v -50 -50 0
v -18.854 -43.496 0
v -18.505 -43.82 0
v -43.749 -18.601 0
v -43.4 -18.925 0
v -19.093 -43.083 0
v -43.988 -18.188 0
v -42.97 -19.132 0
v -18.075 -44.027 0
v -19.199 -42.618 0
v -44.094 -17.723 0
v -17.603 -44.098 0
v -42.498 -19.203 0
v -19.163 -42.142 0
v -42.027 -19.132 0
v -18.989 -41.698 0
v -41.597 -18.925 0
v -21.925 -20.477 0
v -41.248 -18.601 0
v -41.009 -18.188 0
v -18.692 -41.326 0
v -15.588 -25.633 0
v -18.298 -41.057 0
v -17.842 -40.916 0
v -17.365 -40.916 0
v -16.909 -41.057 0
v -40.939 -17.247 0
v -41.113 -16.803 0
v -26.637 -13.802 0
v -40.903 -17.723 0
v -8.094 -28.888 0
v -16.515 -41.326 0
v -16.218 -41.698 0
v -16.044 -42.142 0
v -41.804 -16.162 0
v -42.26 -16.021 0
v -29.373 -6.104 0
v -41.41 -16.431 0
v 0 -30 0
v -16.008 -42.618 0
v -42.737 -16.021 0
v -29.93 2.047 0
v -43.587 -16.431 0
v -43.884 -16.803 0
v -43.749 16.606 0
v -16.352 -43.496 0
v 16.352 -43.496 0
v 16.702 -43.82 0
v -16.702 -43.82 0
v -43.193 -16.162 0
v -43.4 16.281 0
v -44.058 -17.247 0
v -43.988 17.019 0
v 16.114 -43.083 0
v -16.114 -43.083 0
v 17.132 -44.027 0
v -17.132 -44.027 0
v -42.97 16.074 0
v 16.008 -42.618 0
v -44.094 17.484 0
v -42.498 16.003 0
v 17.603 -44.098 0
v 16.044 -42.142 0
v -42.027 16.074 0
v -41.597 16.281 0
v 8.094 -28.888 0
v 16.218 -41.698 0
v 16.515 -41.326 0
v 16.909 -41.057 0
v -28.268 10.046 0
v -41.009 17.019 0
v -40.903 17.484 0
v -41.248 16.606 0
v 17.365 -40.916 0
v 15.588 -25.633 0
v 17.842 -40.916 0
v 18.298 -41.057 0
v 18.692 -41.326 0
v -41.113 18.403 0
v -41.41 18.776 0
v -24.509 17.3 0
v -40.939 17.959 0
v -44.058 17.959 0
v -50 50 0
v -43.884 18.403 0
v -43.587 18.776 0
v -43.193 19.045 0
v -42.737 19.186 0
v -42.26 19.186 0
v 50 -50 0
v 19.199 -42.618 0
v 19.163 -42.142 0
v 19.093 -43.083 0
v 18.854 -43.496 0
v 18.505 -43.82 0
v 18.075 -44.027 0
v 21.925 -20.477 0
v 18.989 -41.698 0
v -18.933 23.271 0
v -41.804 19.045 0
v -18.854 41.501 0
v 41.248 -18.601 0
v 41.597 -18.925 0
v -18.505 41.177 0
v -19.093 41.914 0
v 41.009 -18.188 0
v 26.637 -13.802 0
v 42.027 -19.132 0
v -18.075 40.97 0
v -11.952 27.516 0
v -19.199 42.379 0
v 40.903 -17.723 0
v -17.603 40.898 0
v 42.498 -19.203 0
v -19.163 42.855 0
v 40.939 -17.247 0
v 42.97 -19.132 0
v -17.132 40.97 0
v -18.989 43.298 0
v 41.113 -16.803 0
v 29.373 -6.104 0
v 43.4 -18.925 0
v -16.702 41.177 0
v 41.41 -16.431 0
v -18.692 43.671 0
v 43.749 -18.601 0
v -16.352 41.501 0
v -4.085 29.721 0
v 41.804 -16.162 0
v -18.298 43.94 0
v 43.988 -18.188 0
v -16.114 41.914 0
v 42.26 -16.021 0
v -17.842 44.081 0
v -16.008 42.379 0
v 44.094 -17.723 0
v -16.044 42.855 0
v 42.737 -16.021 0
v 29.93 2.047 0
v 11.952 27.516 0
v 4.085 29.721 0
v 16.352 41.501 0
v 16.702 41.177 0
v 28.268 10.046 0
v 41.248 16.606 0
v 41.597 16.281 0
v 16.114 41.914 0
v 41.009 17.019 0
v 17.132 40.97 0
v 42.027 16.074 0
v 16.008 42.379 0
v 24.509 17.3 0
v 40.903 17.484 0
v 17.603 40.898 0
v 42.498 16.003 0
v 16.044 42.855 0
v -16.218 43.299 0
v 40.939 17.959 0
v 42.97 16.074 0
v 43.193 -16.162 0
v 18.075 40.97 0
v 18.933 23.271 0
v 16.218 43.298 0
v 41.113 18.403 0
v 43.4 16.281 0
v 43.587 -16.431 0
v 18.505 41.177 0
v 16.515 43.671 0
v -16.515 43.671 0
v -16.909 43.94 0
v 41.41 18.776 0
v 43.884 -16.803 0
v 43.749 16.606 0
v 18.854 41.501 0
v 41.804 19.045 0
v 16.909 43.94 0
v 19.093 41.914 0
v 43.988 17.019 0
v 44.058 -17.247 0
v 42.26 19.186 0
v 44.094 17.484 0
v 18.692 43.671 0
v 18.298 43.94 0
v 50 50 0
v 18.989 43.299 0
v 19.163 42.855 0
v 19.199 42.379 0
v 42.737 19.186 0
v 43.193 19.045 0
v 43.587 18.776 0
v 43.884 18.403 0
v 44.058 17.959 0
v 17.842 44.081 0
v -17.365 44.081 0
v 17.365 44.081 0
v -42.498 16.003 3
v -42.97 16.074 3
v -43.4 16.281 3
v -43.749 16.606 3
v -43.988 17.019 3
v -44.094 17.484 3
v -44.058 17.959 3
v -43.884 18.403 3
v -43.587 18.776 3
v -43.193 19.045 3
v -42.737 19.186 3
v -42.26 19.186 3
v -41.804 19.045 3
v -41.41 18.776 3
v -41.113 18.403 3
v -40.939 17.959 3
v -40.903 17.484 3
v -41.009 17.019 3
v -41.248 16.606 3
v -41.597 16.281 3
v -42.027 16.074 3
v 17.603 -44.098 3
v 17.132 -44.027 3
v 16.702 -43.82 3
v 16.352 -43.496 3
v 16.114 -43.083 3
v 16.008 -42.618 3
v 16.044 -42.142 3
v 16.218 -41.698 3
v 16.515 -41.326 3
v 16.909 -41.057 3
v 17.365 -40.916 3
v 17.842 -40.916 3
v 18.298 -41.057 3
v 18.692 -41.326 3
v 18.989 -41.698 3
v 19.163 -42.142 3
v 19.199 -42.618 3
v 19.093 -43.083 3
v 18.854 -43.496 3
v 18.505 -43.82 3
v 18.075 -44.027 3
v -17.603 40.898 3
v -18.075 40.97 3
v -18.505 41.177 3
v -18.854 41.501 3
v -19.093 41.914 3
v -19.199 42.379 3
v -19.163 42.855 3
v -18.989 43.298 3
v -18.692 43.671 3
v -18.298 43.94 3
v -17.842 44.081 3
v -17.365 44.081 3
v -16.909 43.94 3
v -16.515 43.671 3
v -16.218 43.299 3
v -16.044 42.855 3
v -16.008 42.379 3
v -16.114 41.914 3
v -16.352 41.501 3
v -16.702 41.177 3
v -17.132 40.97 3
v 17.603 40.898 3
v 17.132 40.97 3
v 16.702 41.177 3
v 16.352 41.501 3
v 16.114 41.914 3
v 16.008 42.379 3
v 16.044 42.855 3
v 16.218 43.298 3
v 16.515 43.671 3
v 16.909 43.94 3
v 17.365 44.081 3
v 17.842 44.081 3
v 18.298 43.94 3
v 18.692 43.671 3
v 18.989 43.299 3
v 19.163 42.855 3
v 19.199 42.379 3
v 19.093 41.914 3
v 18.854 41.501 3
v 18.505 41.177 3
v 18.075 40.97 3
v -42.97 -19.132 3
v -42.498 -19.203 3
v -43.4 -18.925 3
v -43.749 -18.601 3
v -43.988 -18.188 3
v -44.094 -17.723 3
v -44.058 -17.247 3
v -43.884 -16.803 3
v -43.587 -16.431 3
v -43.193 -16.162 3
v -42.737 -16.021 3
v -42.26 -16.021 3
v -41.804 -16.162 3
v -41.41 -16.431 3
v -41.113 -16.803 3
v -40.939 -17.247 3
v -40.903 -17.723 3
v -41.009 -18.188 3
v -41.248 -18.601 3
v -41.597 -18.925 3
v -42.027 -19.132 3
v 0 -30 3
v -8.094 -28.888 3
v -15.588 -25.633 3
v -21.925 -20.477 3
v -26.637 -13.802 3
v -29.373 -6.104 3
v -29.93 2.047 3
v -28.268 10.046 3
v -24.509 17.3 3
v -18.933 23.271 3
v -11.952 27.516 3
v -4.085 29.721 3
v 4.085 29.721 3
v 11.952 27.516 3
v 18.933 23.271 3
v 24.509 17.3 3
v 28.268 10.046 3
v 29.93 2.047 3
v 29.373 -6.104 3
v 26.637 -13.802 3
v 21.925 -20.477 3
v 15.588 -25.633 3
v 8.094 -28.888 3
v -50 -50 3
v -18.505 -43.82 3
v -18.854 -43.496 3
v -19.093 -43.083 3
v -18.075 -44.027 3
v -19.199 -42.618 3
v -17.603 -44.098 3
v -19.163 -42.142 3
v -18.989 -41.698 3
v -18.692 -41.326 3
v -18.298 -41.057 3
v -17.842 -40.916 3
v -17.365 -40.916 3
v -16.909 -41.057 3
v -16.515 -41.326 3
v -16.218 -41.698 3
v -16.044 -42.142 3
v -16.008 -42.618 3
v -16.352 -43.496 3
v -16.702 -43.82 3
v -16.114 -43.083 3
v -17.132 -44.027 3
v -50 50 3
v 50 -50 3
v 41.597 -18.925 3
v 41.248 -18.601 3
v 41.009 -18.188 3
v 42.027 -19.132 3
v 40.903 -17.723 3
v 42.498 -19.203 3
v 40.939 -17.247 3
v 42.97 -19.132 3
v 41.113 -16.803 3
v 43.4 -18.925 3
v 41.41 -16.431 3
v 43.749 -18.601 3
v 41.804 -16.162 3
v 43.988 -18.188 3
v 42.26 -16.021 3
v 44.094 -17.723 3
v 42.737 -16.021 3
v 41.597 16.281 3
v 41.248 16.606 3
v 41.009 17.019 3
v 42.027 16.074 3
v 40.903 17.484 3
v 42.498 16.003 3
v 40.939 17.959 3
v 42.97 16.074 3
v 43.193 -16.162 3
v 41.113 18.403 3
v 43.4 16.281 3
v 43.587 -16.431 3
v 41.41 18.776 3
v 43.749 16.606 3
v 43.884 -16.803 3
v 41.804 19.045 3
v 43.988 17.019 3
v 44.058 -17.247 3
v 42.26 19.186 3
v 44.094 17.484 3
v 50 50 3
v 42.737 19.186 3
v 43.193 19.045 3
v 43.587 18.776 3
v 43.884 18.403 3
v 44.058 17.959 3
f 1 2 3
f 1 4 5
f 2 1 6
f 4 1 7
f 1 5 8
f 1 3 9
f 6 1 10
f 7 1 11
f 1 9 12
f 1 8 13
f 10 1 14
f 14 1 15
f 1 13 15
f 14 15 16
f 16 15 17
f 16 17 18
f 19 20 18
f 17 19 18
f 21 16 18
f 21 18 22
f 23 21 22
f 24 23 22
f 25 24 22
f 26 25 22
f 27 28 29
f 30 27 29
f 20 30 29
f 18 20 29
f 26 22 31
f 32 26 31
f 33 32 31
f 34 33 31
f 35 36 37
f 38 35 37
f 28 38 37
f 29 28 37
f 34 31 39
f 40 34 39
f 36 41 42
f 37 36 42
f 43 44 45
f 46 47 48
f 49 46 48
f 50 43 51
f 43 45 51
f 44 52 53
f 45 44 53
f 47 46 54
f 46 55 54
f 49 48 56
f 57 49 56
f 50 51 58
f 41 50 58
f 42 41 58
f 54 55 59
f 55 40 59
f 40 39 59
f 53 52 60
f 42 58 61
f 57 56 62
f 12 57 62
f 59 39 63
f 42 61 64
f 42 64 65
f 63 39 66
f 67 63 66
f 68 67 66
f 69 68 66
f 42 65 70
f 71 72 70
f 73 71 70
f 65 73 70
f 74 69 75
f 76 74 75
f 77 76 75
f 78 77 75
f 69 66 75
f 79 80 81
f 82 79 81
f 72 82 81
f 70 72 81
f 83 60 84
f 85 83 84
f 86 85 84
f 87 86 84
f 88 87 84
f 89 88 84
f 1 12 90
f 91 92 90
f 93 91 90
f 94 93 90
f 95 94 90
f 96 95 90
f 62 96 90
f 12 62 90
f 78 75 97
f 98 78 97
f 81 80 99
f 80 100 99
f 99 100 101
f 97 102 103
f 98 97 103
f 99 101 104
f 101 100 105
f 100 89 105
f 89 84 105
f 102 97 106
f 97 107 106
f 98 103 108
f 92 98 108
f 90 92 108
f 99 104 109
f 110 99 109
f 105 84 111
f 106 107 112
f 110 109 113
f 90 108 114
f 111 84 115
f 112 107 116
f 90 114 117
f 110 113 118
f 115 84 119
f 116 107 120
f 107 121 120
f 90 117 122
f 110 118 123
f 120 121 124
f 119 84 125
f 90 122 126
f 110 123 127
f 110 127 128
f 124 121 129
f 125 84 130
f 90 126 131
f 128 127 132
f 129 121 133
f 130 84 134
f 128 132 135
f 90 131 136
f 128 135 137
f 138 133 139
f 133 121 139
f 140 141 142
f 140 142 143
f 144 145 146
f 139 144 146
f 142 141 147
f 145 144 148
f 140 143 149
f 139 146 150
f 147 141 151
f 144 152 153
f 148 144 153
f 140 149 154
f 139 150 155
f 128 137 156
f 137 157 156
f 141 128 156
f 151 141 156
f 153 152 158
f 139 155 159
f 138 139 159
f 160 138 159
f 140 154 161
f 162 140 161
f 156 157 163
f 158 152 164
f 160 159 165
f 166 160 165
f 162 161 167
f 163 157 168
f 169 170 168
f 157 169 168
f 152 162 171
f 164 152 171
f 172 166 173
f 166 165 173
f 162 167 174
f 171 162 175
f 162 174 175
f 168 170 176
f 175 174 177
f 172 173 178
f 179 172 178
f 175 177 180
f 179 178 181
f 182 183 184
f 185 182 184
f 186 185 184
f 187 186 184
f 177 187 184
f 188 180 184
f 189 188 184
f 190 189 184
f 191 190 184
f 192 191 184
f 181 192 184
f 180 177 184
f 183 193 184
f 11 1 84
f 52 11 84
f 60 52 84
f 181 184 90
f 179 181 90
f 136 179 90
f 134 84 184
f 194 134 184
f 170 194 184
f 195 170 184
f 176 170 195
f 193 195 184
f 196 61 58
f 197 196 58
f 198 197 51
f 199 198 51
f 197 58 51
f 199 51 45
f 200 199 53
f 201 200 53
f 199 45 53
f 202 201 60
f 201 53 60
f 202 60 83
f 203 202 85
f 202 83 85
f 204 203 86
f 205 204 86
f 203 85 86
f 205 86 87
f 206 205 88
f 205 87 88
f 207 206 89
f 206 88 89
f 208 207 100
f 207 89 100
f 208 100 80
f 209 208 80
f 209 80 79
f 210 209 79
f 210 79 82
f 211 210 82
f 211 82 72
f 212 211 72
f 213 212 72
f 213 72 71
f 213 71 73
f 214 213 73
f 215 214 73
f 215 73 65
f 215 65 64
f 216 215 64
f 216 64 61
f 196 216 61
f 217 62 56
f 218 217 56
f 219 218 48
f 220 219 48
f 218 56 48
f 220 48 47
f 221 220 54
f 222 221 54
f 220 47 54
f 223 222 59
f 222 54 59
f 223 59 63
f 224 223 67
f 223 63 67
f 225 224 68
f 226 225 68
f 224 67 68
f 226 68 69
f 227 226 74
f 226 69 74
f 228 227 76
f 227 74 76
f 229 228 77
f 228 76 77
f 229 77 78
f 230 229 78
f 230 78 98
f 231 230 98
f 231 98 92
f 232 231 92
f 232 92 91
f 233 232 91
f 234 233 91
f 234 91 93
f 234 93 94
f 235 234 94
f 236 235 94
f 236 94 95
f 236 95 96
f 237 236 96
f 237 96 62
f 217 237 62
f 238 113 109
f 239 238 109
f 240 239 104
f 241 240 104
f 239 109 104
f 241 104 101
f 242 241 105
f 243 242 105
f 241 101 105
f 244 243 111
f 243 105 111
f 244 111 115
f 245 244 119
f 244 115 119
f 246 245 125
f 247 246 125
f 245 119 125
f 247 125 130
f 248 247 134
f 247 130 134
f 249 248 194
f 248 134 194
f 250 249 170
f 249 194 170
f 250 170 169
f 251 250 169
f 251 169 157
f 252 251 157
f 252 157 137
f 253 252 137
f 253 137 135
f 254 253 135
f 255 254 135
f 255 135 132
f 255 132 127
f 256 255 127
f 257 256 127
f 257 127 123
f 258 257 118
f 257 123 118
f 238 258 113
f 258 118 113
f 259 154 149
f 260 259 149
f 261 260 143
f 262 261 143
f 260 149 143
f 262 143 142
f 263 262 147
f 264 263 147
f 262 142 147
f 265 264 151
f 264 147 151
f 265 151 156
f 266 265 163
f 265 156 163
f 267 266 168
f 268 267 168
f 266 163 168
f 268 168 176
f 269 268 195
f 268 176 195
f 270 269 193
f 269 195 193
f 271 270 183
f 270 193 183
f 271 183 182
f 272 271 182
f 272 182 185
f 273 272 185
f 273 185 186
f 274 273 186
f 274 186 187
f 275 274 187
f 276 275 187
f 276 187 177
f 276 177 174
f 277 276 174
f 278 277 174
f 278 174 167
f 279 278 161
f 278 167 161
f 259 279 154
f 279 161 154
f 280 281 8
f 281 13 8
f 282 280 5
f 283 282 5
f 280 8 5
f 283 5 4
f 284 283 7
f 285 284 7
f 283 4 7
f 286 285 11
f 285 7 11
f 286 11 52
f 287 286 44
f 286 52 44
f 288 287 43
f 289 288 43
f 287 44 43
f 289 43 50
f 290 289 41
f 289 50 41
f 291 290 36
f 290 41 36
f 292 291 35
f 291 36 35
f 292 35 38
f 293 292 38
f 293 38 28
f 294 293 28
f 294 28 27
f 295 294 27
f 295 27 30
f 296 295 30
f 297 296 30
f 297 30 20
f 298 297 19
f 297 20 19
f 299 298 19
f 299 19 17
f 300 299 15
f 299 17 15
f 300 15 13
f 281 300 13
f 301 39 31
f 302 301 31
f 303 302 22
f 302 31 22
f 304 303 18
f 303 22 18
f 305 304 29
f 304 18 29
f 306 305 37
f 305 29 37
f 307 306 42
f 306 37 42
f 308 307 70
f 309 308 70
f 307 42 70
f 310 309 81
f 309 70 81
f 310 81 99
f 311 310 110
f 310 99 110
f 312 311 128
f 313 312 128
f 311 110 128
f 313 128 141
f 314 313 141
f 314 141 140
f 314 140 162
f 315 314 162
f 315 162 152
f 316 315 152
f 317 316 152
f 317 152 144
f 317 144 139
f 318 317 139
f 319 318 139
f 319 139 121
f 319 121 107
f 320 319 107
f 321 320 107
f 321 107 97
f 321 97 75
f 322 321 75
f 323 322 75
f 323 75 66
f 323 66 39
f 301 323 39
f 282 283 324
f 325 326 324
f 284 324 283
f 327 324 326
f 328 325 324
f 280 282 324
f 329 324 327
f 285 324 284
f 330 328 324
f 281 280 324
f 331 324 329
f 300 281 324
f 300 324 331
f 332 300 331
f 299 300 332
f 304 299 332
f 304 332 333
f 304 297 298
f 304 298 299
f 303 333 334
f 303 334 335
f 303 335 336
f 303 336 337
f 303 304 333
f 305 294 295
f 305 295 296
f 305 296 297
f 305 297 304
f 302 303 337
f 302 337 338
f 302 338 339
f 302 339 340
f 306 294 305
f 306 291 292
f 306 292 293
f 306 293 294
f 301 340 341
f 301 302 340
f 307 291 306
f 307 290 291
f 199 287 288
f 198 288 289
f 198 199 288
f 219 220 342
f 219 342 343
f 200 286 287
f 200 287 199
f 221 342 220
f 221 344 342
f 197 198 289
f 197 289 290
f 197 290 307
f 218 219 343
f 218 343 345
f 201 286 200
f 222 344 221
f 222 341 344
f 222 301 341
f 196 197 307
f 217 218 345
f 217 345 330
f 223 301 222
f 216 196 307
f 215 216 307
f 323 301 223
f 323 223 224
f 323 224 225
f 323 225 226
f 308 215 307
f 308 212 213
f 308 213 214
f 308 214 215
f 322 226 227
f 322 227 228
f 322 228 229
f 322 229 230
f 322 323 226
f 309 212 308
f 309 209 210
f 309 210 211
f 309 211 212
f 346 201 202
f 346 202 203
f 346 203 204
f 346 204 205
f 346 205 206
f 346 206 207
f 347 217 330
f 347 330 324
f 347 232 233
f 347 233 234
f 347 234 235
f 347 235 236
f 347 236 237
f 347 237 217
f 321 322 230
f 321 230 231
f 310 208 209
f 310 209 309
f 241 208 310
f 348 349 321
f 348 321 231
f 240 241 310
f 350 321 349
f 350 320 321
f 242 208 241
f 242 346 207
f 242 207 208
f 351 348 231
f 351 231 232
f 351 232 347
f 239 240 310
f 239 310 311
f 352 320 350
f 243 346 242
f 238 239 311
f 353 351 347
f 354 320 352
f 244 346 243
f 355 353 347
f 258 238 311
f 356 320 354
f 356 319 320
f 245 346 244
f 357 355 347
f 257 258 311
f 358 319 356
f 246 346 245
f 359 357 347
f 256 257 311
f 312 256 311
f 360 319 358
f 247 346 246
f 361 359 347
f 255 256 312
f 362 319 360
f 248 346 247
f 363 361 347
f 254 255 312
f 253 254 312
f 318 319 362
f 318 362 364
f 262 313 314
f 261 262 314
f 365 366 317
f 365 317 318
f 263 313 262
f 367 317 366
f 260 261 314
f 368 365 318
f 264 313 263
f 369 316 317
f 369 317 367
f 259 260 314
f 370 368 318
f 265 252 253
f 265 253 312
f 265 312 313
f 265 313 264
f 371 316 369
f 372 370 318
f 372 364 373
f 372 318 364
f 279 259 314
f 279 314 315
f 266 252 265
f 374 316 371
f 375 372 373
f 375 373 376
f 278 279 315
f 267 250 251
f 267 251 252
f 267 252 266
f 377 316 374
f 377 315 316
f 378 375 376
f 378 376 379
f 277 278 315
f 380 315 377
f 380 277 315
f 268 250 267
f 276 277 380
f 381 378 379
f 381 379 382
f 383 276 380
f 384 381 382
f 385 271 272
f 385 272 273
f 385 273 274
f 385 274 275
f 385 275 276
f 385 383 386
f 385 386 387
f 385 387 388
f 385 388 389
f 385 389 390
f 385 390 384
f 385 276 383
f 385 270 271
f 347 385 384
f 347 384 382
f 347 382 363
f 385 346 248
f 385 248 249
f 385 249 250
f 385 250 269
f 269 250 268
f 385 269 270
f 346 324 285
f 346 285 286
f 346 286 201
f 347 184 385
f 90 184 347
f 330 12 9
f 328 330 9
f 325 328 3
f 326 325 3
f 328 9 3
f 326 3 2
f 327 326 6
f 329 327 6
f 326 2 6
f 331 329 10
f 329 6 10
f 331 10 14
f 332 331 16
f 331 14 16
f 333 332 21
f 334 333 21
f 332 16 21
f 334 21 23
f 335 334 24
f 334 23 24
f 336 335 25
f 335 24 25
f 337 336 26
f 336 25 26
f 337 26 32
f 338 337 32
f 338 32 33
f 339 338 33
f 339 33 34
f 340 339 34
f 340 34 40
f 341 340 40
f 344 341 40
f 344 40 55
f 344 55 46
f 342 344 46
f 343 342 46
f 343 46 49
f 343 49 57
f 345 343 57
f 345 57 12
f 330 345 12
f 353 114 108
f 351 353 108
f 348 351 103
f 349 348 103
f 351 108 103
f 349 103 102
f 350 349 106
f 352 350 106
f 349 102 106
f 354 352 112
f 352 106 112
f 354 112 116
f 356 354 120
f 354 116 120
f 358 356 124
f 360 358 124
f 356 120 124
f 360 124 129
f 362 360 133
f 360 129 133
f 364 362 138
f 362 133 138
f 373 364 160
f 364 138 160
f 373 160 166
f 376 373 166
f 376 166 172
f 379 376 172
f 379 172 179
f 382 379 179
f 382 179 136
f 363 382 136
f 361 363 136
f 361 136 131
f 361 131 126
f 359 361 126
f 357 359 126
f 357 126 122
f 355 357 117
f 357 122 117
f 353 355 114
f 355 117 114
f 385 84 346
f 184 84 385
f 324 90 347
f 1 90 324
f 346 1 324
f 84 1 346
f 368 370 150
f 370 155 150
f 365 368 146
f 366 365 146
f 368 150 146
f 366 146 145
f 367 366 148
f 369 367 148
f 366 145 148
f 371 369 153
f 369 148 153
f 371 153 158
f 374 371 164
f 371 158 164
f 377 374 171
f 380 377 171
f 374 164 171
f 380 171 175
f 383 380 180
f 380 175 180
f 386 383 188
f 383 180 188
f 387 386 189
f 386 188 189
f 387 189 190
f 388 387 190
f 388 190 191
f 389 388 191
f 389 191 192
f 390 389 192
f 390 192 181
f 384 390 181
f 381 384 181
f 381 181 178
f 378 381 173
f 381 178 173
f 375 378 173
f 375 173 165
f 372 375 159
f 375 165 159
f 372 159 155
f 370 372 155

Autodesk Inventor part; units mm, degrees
ref_plane "YZ Plane" through (0, 0, 0) normal (1, 0, 0) x (0, 1, 0)
ref_plane "XZ Plane" through (0, 0, 0) normal (0, 1, 0) x (-1, 0, 0)
ref_plane "XY Plane" through (0, 0, 0) normal (0, 0, 1) x (1, 0, 0)
sketch "スケッチ1" plane through (0, 0, 0) normal (0, 0, 1) x (1, 0, 0)
  line L0 (-50, 50) -> (50, 50)
  line L1 (50, 50) -> (50, -50)
  line L2 (50, -50) -> (-50, -50)
  line L3 (-50, -50) -> (-50, 50)
  line L4 (0, 0) -> (0, 50) construction
  line L5 (0, 0) -> (50, 0) construction
  dimension "d0" = 100
  dimension "d1" = 100
extrude "押し出し1" add sketch "スケッチ1" along normal blind 3
sketch "スケッチ2" plane through (0, 0, 3) normal (0, 0, 1) x (1, 0, 0)
  point P0 (0, 0)
  point P1 (0, 0)
hole "穴1" at (0, 0, 3) direction (0, 0, -1) diameter 60 end through all
sketch "スケッチ3" plane through (0, 0, 3) normal (0, 0, 1) x (1, 0, 0)
  line L0 (0, 0) -> (0, 50) construction
  line L1 (50, 50) -> (-50, 50) projected
  line L2 (0, 0) -> (19.8012, 47.8043) construction
  point P0 (17.6034, 42.4985)
  point P1 (-17.6034, 42.4985)
  point P2 (-42.4985, 17.6034)
  point P3 (-42.4985, -17.6034)
  point P4 (-17.6034, -42.4985)
  point P5 (17.6034, -42.4985)
  point P6 (42.4985, -17.6034)
  point P7 (42.4985, 17.6034)
  dimension "d11" = 22.5
  dimension "d12" = 46
  dimension "d15" = 360
hole "穴2" at (17.6034, 42.4985, 3) at (-17.6034, 42.4985, 3) at (-42.4985, 17.6034, 3) at (-42.4985, -17.6034, 3) at (-17.6034, -42.4985, 3) at (17.6034, -42.4985, 3) at (42.4985, -17.6034, 3) at (42.4985, 17.6034, 3) direction (0, 0, -1) diameter 3.2 end through all
properties part number "base_plate" material "アルミニウム 6061"
